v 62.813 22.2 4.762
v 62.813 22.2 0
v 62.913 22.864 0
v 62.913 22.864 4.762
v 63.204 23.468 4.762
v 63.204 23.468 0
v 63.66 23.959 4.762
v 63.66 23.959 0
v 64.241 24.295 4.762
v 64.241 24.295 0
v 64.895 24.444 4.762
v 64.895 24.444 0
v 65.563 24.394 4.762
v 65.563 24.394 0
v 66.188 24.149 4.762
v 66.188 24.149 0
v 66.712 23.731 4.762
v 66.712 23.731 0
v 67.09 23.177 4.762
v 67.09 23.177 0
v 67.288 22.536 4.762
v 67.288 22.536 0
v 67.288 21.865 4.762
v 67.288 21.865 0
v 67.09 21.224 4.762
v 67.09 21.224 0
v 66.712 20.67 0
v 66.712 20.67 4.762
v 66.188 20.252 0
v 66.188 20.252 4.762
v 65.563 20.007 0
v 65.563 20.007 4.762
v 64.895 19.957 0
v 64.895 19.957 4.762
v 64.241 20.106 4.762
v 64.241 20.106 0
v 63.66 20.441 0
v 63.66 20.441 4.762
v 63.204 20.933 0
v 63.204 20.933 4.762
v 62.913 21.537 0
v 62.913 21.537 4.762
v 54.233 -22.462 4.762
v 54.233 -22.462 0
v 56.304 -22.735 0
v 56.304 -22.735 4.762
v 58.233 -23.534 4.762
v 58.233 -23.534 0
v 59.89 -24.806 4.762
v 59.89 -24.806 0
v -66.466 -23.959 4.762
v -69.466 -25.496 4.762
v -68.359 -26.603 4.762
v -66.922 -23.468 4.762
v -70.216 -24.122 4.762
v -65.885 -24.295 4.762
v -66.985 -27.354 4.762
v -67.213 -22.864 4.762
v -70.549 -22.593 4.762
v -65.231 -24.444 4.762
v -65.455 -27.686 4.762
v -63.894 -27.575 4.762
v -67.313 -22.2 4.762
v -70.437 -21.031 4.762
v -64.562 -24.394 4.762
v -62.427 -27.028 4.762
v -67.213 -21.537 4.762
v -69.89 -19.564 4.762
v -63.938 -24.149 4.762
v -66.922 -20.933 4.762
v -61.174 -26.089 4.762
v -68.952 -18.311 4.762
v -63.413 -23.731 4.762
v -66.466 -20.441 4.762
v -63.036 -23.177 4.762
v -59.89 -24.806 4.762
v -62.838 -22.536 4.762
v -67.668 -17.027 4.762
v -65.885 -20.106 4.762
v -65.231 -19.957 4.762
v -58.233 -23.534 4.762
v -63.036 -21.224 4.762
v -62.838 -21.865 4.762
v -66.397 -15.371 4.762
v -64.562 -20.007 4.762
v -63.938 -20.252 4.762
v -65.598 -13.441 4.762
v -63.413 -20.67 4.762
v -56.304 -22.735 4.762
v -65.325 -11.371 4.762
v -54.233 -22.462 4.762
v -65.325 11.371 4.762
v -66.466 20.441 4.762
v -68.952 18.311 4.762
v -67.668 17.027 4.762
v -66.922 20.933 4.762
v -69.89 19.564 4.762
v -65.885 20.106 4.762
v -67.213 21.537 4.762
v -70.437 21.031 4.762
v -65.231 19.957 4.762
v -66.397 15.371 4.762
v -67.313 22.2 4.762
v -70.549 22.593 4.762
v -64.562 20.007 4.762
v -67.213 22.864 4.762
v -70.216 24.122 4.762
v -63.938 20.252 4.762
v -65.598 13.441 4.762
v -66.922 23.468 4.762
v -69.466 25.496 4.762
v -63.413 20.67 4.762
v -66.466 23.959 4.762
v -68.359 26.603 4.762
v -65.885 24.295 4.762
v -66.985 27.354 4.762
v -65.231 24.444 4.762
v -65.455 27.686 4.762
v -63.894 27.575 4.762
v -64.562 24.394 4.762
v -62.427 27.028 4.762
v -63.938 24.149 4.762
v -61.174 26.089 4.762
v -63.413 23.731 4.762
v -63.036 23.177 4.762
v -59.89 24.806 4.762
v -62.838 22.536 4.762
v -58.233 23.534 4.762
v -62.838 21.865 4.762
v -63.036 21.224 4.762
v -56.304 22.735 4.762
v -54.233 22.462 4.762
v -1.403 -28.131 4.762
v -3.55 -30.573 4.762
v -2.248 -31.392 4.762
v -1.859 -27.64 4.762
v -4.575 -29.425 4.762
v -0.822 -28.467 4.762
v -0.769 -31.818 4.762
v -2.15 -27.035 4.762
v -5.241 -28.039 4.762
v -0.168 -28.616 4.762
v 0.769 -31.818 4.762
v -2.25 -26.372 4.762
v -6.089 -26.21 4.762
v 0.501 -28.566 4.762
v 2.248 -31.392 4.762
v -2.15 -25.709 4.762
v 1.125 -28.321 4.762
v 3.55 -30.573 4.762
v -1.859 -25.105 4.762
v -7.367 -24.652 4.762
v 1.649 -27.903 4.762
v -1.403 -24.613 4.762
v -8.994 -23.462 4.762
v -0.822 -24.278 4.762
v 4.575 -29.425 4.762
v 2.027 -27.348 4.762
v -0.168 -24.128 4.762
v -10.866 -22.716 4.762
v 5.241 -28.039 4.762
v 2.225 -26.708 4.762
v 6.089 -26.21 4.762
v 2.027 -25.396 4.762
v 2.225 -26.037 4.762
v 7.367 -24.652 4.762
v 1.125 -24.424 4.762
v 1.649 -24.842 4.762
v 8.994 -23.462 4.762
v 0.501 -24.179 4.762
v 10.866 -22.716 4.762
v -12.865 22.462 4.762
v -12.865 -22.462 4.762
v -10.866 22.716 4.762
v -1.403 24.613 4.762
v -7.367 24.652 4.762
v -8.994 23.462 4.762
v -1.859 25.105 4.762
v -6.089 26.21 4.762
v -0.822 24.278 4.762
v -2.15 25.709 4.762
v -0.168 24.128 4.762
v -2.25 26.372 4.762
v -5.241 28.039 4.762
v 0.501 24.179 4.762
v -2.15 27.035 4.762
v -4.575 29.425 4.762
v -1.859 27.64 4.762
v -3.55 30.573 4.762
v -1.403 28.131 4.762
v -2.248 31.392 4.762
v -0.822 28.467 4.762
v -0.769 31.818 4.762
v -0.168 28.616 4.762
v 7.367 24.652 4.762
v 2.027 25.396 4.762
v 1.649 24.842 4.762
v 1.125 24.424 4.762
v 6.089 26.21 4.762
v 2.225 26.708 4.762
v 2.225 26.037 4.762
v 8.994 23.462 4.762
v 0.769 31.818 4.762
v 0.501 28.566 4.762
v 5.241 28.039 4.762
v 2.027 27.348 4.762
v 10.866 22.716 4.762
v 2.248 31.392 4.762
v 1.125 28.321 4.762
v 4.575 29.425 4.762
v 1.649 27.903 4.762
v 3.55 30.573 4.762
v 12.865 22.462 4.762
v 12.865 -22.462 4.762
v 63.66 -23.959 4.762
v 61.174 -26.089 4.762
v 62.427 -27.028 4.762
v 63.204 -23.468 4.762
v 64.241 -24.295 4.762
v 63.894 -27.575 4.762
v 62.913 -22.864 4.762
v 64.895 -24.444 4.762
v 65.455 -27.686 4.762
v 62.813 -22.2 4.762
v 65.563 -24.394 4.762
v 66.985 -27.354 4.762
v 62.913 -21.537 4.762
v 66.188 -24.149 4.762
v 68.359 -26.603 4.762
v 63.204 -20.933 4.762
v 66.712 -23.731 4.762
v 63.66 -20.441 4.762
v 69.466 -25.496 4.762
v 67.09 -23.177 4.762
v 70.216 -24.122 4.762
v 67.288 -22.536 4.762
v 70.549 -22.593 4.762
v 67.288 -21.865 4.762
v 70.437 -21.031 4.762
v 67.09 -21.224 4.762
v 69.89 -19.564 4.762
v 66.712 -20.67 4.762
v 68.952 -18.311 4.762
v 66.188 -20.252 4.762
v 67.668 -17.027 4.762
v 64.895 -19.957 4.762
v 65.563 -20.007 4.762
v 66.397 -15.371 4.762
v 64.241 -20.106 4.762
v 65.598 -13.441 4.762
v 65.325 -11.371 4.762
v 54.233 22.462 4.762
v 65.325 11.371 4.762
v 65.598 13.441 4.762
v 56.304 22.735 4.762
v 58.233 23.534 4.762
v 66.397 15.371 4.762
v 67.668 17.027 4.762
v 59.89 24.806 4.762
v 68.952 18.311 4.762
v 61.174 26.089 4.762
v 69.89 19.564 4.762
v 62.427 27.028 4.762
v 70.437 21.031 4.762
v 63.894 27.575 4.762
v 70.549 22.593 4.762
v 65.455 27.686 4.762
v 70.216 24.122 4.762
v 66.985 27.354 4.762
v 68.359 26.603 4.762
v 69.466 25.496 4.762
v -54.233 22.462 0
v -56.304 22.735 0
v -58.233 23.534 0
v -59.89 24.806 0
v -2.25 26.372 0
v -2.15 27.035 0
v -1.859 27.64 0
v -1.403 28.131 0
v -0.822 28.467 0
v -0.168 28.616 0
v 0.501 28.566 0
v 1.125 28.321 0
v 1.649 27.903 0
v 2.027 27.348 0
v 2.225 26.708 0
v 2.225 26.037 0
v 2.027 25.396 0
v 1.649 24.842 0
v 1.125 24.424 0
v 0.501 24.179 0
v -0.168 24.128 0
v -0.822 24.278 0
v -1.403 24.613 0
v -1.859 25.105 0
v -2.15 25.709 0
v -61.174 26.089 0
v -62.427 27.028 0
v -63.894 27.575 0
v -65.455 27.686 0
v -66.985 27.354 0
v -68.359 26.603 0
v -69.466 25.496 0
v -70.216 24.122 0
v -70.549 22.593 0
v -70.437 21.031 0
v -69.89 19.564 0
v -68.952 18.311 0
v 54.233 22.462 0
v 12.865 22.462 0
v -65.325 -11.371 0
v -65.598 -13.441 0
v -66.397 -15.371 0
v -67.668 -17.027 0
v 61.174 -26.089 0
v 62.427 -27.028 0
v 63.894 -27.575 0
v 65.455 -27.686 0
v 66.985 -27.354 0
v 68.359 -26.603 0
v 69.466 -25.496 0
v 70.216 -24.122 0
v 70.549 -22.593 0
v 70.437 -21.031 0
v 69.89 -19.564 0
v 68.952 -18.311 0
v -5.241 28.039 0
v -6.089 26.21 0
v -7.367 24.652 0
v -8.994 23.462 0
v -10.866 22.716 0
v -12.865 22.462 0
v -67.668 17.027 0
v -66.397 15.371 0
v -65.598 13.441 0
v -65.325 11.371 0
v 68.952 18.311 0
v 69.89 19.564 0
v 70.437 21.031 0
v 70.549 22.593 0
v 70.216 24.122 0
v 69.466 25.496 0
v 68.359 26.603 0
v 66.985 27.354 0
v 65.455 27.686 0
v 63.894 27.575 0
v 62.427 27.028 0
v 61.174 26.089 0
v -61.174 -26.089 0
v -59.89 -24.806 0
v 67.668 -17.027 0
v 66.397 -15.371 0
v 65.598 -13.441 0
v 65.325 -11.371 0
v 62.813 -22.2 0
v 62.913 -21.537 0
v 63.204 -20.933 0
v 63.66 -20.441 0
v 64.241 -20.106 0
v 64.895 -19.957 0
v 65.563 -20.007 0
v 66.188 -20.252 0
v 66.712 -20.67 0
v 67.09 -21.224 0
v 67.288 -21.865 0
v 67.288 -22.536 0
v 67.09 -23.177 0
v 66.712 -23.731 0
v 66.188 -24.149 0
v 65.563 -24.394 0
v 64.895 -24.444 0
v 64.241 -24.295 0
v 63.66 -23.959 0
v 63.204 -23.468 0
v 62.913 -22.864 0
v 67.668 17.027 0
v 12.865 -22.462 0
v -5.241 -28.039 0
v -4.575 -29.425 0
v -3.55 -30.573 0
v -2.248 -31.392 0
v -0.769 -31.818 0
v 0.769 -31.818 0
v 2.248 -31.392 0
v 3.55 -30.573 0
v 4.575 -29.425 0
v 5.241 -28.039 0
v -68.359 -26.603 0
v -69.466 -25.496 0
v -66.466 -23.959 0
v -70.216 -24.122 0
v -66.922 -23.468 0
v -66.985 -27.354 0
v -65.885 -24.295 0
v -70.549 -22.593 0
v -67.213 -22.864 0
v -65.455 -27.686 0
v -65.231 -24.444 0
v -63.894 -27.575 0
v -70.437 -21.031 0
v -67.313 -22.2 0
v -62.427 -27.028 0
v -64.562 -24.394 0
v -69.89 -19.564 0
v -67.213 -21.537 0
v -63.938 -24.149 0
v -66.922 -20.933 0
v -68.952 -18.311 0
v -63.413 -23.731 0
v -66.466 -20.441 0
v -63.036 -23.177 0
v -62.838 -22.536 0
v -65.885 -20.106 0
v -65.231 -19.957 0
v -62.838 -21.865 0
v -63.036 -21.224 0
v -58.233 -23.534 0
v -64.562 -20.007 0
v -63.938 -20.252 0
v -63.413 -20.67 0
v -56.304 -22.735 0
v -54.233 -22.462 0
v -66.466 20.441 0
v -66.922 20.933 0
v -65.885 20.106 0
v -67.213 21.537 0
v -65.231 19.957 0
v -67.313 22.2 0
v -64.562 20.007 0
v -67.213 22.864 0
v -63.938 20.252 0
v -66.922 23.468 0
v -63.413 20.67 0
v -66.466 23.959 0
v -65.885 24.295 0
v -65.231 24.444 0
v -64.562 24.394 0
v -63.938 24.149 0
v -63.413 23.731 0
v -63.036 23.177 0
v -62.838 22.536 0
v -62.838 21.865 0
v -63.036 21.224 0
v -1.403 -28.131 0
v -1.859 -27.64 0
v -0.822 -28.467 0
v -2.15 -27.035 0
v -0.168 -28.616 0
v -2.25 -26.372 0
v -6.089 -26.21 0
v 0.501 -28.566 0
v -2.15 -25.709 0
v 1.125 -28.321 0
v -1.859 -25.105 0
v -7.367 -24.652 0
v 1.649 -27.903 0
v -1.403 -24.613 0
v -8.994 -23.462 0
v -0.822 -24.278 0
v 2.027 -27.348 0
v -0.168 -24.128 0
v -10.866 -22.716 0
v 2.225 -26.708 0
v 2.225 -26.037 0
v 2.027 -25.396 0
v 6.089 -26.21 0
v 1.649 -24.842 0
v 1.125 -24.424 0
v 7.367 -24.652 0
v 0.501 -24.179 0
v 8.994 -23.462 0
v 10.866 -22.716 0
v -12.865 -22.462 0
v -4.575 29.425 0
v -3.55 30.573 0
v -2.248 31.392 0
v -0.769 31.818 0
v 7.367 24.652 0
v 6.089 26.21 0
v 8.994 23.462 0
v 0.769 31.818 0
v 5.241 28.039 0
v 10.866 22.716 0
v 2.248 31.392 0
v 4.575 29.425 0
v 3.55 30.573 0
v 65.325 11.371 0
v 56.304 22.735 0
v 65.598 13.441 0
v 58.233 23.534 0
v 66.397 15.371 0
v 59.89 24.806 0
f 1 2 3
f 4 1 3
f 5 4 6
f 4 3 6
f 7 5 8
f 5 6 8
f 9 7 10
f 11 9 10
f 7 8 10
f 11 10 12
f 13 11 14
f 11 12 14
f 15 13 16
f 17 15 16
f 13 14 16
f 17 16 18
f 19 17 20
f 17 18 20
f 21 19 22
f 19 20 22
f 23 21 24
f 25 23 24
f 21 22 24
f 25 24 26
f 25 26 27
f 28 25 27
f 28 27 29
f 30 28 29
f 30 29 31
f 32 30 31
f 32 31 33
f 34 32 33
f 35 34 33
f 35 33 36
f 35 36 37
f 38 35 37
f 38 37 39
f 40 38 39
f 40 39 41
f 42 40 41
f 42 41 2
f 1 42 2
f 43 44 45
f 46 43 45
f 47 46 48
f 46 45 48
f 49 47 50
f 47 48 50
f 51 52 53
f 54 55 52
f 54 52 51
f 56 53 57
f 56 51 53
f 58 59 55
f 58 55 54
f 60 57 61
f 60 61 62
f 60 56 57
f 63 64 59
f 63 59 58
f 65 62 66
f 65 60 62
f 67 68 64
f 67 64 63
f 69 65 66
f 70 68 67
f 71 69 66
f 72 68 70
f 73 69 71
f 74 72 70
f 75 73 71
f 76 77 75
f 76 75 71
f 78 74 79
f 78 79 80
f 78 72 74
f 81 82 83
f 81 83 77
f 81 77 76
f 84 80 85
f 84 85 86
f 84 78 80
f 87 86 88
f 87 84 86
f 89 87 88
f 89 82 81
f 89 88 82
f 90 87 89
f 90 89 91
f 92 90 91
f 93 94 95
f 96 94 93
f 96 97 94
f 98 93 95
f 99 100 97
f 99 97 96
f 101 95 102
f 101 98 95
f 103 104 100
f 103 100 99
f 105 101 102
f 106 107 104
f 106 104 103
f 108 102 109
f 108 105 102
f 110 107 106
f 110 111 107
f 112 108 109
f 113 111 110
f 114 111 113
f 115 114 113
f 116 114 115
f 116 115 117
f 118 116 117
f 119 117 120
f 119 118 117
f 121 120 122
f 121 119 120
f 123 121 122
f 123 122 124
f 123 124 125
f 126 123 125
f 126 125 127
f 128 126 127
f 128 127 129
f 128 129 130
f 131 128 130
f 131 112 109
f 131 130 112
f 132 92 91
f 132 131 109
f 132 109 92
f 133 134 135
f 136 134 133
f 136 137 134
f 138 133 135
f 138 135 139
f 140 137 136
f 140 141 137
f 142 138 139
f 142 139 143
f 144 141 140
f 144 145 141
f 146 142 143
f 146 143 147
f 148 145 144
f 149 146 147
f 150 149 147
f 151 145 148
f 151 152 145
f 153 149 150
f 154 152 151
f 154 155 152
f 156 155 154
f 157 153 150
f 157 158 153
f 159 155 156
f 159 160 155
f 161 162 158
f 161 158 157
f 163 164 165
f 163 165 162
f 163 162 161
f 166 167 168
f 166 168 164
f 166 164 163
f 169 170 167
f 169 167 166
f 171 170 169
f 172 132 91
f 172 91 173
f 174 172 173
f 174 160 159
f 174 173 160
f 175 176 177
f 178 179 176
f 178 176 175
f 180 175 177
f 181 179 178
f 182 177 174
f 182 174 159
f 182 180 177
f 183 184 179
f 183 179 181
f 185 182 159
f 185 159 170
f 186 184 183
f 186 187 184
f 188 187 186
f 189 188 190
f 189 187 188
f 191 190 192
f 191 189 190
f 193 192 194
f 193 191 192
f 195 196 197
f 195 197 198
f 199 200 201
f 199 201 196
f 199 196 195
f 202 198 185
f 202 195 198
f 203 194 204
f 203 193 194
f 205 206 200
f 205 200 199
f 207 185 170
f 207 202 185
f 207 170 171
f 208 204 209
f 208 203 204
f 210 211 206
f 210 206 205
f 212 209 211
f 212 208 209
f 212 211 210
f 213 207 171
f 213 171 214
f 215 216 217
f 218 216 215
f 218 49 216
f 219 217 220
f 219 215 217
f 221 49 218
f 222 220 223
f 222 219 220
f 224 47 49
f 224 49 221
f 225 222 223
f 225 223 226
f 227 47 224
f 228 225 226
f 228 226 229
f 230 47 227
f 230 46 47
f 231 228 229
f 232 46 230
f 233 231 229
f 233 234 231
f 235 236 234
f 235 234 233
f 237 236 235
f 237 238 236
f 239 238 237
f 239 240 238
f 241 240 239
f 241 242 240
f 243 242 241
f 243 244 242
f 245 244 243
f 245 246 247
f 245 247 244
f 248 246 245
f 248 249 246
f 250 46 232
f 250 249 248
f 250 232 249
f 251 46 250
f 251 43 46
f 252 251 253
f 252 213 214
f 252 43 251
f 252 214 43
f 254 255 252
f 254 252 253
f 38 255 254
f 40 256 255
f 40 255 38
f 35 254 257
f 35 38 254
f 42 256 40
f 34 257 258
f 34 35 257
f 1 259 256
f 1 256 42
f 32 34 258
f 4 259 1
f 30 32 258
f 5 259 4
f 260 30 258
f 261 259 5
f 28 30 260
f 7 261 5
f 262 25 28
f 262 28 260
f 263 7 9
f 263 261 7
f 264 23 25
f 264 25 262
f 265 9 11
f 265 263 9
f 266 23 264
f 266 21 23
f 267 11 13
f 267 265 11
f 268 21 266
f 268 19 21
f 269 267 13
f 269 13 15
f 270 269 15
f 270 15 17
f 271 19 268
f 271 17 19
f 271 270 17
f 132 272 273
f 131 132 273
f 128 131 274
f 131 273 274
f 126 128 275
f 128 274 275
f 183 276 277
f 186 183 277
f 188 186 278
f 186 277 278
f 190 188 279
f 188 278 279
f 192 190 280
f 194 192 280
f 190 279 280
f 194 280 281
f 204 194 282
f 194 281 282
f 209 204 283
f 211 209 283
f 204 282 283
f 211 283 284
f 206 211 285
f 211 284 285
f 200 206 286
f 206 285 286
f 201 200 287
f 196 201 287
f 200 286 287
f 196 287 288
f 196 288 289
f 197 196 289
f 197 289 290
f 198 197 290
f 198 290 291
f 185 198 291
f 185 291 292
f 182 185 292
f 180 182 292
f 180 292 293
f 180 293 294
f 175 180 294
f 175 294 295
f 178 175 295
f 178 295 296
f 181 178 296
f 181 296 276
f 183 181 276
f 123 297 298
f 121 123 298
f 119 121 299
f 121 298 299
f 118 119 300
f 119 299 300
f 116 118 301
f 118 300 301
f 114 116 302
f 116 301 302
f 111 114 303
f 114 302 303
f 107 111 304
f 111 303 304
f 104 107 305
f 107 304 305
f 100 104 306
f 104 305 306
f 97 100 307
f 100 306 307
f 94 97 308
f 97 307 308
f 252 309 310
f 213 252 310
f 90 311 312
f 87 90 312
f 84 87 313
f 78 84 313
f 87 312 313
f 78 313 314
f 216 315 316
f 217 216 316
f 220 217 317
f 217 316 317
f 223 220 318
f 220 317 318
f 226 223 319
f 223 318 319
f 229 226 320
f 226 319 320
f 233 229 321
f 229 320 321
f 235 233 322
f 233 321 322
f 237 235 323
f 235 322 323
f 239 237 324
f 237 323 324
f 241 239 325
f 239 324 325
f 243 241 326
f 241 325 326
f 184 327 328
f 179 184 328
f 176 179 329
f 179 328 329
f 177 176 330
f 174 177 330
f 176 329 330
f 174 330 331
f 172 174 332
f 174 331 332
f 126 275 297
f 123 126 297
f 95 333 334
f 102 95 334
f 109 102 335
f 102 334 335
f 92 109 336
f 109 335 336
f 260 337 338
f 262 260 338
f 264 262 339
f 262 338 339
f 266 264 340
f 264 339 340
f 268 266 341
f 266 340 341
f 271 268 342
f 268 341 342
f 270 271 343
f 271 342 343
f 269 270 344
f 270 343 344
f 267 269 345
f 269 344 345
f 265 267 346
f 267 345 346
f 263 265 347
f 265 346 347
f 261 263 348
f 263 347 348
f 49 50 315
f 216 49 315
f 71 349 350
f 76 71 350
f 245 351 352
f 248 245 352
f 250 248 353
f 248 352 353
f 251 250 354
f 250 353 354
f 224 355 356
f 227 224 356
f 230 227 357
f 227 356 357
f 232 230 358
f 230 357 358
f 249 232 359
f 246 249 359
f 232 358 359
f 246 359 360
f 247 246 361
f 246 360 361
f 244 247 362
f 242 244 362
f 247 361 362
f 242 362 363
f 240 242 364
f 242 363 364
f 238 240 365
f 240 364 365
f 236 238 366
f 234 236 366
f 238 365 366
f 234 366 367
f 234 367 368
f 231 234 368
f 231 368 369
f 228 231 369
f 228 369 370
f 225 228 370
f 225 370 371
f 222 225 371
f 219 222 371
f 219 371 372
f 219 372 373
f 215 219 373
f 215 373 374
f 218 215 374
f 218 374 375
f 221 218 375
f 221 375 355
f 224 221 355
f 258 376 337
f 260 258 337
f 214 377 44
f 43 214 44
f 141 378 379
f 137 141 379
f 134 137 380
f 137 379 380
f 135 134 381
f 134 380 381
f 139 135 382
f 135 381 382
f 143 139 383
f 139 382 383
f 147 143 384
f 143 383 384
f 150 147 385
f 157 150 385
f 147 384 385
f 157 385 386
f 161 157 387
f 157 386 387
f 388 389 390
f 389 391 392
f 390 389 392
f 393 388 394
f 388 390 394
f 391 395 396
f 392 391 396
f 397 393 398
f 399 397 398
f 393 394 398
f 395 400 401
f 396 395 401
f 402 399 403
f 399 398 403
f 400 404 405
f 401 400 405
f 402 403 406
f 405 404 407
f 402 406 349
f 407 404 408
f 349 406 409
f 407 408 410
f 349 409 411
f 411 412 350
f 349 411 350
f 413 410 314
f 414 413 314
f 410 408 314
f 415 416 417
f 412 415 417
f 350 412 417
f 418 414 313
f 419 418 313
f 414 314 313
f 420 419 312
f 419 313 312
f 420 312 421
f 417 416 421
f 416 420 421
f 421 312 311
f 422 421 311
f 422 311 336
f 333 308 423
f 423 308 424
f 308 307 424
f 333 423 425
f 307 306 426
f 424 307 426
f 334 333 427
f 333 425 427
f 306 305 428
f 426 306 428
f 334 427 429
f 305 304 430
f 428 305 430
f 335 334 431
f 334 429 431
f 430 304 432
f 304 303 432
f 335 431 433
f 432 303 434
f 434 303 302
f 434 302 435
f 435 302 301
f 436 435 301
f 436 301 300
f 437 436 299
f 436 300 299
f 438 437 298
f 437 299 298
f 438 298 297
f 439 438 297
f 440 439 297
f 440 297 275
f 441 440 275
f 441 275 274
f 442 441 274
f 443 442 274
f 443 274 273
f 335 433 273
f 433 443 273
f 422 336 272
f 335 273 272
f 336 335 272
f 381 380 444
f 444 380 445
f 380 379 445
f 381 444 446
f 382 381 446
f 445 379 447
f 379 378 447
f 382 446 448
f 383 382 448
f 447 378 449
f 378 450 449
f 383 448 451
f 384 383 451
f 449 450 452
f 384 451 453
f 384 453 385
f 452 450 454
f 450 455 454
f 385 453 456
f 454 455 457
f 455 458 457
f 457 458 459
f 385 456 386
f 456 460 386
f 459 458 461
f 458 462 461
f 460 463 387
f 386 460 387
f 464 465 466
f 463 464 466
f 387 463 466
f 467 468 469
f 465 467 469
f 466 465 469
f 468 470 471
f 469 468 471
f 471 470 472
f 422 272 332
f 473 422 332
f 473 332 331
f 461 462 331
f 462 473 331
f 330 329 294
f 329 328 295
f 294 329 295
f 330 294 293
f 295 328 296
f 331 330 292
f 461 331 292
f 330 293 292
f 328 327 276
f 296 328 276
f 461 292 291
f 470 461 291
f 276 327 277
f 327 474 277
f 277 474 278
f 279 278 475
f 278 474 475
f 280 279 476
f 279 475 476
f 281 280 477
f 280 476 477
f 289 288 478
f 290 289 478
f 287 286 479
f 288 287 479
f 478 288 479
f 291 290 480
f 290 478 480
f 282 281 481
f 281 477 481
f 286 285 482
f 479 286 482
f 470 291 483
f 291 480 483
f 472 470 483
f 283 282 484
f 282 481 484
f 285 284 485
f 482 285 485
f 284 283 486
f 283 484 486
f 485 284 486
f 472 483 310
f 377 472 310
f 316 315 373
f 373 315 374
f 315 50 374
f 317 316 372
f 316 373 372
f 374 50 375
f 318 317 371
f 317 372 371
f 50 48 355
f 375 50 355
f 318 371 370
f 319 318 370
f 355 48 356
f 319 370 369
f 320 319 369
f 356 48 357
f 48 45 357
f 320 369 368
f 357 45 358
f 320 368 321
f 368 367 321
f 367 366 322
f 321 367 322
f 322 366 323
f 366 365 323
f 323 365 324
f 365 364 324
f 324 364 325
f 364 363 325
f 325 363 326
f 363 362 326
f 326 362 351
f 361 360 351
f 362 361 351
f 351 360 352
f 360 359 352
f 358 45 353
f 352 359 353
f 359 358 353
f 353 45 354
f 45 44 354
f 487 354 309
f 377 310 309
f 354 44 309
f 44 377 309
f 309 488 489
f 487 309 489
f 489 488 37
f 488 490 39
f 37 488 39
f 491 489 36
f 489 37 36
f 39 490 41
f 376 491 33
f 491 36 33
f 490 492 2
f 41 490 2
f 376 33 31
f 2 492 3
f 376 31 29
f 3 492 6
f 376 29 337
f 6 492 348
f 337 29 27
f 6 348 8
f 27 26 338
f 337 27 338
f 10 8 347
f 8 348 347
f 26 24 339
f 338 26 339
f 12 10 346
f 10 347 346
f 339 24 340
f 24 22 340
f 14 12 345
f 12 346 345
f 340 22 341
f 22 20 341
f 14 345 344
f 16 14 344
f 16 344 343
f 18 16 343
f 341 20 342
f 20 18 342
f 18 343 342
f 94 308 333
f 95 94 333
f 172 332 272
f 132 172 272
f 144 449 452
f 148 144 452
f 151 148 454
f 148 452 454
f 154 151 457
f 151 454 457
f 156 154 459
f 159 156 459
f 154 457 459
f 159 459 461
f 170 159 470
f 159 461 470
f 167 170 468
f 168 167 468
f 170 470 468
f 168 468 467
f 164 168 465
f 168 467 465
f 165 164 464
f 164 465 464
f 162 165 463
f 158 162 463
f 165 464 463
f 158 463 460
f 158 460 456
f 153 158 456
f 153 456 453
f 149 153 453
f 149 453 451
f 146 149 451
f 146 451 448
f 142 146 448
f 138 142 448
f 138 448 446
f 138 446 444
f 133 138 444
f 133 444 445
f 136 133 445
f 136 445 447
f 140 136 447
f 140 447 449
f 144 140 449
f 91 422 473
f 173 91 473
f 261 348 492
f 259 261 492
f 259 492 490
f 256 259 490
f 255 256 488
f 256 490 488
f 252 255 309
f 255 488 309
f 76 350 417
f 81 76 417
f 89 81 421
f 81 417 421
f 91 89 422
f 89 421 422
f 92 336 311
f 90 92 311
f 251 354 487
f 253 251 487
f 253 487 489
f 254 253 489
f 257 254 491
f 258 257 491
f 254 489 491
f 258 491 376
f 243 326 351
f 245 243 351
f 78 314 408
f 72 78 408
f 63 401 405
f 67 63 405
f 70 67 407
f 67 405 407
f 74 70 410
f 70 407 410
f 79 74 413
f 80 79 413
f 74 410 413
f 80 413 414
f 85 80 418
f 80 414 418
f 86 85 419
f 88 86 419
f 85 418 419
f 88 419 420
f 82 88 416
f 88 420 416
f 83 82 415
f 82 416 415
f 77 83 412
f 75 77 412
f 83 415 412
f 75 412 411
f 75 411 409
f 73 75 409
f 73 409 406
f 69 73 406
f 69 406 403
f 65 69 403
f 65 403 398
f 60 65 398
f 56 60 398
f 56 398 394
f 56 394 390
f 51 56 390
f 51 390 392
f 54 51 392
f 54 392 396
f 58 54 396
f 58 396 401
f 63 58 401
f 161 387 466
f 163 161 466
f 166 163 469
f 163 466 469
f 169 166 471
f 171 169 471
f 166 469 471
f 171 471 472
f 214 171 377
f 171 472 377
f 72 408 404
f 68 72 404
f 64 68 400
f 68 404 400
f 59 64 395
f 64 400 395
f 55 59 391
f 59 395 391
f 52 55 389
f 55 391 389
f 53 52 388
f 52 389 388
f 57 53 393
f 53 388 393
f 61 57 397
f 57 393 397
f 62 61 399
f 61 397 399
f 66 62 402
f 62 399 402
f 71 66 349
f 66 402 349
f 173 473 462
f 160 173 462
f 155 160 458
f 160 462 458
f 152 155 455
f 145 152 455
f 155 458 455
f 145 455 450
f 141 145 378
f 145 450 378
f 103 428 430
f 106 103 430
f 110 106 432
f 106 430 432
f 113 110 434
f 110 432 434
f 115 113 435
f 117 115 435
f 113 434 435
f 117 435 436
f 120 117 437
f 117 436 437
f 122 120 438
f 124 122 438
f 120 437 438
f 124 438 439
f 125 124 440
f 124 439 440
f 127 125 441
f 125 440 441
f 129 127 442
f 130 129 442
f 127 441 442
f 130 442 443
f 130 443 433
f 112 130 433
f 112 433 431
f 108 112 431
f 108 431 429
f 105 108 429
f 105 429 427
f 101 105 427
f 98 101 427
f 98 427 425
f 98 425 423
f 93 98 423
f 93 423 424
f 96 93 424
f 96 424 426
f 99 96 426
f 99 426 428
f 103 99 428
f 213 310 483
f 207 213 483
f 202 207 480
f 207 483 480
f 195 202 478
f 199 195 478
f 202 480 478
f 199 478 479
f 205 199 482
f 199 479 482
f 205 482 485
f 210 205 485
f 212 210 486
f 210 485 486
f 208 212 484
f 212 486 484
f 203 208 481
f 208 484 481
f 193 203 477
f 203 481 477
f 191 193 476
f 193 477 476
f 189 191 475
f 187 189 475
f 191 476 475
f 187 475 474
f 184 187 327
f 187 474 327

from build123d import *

# Parameters (mm, degrees)
BOSS_EXTRUDE1_DEPTH  = 4.7625
M4_CLEARANCE_HOLE1_D = 4.5


with BuildPart() as part:
    # Sketch1 → Boss-Extrude1 (new body)
    with BuildSketch(Plane.XY):
        with BuildLine():
            Line((61.173729563, 26.089404156), (59.889971157, 24.805645751))
            ThreePointArc((59.889971157, 24.805645751), (57.294584367, 23.07146374), (54.233116908, 22.4625))
            Line((54.233116908, 22.4625), (12.865436095, 22.4625))
            ThreePointArc((12.865436095, 22.4625), (8.142674818, 24.005292715), (5.241473965, 28.038618519))
            ThreePointArc((5.241473965, 28.038618519), (0, 31.8722), (-5.241473965, 28.038618519))
            ThreePointArc((-5.241473965, 28.038618519), (-8.142674818, 24.005292715), (-12.865436095, 22.4625))
            Line((-12.865436095, 22.4625), (-54.233116908, 22.4625))
            ThreePointArc((-54.233116908, 22.4625), (-57.294584367, 23.07146374), (-59.889971157, 24.805645751))
            Line((-59.889971157, 24.805645751), (-61.173729563, 26.089404156))
            ThreePointArc((-61.173729563, 26.089404156), (-68.951904156, 26.089404156), (-68.951904156, 18.311229563))
            Line((-68.951904156, 18.311229563), (-67.668145751, 17.027471157))
            ThreePointArc((-67.668145751, 17.027471157), (-65.93396374, 14.432084367), (-65.325, 11.370616908))
            Line((-65.325, 11.370616908), (-65.325, -11.370616908))
            ThreePointArc((-65.325, -11.370616908), (-65.93396374, -14.432084367), (-67.668145751, -17.027471157))
            Line((-67.668145751, -17.027471157), (-68.951904156, -18.311229563))
            ThreePointArc((-68.951904156, -18.311229563), (-68.951904156, -26.089404156), (-61.173729563, -26.089404156))
            Line((-61.173729563, -26.089404156), (-59.889971157, -24.805645751))
            ThreePointArc((-59.889971157, -24.805645751), (-57.294584367, -23.07146374), (-54.233116908, -22.4625))
            Line((-54.233116908, -22.4625), (-12.865436095, -22.4625))
            ThreePointArc((-12.865436095, -22.4625), (-8.142674818, -24.005292715), (-5.241473965, -28.038618519))
            ThreePointArc((-5.241473965, -28.038618519), (0, -31.8722), (5.241473965, -28.038618519))
            ThreePointArc((5.241473965, -28.038618519), (8.142674818, -24.005292715), (12.865436095, -22.4625))
            Line((12.865436095, -22.4625), (54.233116908, -22.4625))
            ThreePointArc((54.233116908, -22.4625), (57.294584367, -23.07146374), (59.889971157, -24.805645751))
            Line((59.889971157, -24.805645751), (61.173729563, -26.089404156))
            ThreePointArc((61.173729563, -26.089404156), (68.951904156, -26.089404156), (68.951904156, -18.311229563))
            Line((68.951904156, -18.311229563), (67.668145751, -17.027471157))
            ThreePointArc((67.668145751, -17.027471157), (65.93396374, -14.432084367), (65.325, -11.370616908))
            Line((65.325, -11.370616908), (65.325, 11.370616908))
            ThreePointArc((65.325, 11.370616908), (65.93396374, 14.432084367), (67.668145751, 17.027471157))
            Line((67.668145751, 17.027471157), (68.951904156, 18.311229563))
            ThreePointArc((68.951904156, 18.311229563), (68.951904156, 26.089404156), (61.173729563, 26.089404156))
        make_face()
    extrude(amount=BOSS_EXTRUDE1_DEPTH)

    # M4 Clearance Hole1 (through all)
    with Locations(Plane.XY.offset(4.7625)):
        with Locations((-65.062816859, 22.200316859), (0, 26.3722), (65.062816859, 22.200316859), (65.062816859, -22.200316859), (0, -26.3722), (-65.062816859, -22.200316859)):
            Hole(M4_CLEARANCE_HOLE1_D / 2)


solid = part.part
